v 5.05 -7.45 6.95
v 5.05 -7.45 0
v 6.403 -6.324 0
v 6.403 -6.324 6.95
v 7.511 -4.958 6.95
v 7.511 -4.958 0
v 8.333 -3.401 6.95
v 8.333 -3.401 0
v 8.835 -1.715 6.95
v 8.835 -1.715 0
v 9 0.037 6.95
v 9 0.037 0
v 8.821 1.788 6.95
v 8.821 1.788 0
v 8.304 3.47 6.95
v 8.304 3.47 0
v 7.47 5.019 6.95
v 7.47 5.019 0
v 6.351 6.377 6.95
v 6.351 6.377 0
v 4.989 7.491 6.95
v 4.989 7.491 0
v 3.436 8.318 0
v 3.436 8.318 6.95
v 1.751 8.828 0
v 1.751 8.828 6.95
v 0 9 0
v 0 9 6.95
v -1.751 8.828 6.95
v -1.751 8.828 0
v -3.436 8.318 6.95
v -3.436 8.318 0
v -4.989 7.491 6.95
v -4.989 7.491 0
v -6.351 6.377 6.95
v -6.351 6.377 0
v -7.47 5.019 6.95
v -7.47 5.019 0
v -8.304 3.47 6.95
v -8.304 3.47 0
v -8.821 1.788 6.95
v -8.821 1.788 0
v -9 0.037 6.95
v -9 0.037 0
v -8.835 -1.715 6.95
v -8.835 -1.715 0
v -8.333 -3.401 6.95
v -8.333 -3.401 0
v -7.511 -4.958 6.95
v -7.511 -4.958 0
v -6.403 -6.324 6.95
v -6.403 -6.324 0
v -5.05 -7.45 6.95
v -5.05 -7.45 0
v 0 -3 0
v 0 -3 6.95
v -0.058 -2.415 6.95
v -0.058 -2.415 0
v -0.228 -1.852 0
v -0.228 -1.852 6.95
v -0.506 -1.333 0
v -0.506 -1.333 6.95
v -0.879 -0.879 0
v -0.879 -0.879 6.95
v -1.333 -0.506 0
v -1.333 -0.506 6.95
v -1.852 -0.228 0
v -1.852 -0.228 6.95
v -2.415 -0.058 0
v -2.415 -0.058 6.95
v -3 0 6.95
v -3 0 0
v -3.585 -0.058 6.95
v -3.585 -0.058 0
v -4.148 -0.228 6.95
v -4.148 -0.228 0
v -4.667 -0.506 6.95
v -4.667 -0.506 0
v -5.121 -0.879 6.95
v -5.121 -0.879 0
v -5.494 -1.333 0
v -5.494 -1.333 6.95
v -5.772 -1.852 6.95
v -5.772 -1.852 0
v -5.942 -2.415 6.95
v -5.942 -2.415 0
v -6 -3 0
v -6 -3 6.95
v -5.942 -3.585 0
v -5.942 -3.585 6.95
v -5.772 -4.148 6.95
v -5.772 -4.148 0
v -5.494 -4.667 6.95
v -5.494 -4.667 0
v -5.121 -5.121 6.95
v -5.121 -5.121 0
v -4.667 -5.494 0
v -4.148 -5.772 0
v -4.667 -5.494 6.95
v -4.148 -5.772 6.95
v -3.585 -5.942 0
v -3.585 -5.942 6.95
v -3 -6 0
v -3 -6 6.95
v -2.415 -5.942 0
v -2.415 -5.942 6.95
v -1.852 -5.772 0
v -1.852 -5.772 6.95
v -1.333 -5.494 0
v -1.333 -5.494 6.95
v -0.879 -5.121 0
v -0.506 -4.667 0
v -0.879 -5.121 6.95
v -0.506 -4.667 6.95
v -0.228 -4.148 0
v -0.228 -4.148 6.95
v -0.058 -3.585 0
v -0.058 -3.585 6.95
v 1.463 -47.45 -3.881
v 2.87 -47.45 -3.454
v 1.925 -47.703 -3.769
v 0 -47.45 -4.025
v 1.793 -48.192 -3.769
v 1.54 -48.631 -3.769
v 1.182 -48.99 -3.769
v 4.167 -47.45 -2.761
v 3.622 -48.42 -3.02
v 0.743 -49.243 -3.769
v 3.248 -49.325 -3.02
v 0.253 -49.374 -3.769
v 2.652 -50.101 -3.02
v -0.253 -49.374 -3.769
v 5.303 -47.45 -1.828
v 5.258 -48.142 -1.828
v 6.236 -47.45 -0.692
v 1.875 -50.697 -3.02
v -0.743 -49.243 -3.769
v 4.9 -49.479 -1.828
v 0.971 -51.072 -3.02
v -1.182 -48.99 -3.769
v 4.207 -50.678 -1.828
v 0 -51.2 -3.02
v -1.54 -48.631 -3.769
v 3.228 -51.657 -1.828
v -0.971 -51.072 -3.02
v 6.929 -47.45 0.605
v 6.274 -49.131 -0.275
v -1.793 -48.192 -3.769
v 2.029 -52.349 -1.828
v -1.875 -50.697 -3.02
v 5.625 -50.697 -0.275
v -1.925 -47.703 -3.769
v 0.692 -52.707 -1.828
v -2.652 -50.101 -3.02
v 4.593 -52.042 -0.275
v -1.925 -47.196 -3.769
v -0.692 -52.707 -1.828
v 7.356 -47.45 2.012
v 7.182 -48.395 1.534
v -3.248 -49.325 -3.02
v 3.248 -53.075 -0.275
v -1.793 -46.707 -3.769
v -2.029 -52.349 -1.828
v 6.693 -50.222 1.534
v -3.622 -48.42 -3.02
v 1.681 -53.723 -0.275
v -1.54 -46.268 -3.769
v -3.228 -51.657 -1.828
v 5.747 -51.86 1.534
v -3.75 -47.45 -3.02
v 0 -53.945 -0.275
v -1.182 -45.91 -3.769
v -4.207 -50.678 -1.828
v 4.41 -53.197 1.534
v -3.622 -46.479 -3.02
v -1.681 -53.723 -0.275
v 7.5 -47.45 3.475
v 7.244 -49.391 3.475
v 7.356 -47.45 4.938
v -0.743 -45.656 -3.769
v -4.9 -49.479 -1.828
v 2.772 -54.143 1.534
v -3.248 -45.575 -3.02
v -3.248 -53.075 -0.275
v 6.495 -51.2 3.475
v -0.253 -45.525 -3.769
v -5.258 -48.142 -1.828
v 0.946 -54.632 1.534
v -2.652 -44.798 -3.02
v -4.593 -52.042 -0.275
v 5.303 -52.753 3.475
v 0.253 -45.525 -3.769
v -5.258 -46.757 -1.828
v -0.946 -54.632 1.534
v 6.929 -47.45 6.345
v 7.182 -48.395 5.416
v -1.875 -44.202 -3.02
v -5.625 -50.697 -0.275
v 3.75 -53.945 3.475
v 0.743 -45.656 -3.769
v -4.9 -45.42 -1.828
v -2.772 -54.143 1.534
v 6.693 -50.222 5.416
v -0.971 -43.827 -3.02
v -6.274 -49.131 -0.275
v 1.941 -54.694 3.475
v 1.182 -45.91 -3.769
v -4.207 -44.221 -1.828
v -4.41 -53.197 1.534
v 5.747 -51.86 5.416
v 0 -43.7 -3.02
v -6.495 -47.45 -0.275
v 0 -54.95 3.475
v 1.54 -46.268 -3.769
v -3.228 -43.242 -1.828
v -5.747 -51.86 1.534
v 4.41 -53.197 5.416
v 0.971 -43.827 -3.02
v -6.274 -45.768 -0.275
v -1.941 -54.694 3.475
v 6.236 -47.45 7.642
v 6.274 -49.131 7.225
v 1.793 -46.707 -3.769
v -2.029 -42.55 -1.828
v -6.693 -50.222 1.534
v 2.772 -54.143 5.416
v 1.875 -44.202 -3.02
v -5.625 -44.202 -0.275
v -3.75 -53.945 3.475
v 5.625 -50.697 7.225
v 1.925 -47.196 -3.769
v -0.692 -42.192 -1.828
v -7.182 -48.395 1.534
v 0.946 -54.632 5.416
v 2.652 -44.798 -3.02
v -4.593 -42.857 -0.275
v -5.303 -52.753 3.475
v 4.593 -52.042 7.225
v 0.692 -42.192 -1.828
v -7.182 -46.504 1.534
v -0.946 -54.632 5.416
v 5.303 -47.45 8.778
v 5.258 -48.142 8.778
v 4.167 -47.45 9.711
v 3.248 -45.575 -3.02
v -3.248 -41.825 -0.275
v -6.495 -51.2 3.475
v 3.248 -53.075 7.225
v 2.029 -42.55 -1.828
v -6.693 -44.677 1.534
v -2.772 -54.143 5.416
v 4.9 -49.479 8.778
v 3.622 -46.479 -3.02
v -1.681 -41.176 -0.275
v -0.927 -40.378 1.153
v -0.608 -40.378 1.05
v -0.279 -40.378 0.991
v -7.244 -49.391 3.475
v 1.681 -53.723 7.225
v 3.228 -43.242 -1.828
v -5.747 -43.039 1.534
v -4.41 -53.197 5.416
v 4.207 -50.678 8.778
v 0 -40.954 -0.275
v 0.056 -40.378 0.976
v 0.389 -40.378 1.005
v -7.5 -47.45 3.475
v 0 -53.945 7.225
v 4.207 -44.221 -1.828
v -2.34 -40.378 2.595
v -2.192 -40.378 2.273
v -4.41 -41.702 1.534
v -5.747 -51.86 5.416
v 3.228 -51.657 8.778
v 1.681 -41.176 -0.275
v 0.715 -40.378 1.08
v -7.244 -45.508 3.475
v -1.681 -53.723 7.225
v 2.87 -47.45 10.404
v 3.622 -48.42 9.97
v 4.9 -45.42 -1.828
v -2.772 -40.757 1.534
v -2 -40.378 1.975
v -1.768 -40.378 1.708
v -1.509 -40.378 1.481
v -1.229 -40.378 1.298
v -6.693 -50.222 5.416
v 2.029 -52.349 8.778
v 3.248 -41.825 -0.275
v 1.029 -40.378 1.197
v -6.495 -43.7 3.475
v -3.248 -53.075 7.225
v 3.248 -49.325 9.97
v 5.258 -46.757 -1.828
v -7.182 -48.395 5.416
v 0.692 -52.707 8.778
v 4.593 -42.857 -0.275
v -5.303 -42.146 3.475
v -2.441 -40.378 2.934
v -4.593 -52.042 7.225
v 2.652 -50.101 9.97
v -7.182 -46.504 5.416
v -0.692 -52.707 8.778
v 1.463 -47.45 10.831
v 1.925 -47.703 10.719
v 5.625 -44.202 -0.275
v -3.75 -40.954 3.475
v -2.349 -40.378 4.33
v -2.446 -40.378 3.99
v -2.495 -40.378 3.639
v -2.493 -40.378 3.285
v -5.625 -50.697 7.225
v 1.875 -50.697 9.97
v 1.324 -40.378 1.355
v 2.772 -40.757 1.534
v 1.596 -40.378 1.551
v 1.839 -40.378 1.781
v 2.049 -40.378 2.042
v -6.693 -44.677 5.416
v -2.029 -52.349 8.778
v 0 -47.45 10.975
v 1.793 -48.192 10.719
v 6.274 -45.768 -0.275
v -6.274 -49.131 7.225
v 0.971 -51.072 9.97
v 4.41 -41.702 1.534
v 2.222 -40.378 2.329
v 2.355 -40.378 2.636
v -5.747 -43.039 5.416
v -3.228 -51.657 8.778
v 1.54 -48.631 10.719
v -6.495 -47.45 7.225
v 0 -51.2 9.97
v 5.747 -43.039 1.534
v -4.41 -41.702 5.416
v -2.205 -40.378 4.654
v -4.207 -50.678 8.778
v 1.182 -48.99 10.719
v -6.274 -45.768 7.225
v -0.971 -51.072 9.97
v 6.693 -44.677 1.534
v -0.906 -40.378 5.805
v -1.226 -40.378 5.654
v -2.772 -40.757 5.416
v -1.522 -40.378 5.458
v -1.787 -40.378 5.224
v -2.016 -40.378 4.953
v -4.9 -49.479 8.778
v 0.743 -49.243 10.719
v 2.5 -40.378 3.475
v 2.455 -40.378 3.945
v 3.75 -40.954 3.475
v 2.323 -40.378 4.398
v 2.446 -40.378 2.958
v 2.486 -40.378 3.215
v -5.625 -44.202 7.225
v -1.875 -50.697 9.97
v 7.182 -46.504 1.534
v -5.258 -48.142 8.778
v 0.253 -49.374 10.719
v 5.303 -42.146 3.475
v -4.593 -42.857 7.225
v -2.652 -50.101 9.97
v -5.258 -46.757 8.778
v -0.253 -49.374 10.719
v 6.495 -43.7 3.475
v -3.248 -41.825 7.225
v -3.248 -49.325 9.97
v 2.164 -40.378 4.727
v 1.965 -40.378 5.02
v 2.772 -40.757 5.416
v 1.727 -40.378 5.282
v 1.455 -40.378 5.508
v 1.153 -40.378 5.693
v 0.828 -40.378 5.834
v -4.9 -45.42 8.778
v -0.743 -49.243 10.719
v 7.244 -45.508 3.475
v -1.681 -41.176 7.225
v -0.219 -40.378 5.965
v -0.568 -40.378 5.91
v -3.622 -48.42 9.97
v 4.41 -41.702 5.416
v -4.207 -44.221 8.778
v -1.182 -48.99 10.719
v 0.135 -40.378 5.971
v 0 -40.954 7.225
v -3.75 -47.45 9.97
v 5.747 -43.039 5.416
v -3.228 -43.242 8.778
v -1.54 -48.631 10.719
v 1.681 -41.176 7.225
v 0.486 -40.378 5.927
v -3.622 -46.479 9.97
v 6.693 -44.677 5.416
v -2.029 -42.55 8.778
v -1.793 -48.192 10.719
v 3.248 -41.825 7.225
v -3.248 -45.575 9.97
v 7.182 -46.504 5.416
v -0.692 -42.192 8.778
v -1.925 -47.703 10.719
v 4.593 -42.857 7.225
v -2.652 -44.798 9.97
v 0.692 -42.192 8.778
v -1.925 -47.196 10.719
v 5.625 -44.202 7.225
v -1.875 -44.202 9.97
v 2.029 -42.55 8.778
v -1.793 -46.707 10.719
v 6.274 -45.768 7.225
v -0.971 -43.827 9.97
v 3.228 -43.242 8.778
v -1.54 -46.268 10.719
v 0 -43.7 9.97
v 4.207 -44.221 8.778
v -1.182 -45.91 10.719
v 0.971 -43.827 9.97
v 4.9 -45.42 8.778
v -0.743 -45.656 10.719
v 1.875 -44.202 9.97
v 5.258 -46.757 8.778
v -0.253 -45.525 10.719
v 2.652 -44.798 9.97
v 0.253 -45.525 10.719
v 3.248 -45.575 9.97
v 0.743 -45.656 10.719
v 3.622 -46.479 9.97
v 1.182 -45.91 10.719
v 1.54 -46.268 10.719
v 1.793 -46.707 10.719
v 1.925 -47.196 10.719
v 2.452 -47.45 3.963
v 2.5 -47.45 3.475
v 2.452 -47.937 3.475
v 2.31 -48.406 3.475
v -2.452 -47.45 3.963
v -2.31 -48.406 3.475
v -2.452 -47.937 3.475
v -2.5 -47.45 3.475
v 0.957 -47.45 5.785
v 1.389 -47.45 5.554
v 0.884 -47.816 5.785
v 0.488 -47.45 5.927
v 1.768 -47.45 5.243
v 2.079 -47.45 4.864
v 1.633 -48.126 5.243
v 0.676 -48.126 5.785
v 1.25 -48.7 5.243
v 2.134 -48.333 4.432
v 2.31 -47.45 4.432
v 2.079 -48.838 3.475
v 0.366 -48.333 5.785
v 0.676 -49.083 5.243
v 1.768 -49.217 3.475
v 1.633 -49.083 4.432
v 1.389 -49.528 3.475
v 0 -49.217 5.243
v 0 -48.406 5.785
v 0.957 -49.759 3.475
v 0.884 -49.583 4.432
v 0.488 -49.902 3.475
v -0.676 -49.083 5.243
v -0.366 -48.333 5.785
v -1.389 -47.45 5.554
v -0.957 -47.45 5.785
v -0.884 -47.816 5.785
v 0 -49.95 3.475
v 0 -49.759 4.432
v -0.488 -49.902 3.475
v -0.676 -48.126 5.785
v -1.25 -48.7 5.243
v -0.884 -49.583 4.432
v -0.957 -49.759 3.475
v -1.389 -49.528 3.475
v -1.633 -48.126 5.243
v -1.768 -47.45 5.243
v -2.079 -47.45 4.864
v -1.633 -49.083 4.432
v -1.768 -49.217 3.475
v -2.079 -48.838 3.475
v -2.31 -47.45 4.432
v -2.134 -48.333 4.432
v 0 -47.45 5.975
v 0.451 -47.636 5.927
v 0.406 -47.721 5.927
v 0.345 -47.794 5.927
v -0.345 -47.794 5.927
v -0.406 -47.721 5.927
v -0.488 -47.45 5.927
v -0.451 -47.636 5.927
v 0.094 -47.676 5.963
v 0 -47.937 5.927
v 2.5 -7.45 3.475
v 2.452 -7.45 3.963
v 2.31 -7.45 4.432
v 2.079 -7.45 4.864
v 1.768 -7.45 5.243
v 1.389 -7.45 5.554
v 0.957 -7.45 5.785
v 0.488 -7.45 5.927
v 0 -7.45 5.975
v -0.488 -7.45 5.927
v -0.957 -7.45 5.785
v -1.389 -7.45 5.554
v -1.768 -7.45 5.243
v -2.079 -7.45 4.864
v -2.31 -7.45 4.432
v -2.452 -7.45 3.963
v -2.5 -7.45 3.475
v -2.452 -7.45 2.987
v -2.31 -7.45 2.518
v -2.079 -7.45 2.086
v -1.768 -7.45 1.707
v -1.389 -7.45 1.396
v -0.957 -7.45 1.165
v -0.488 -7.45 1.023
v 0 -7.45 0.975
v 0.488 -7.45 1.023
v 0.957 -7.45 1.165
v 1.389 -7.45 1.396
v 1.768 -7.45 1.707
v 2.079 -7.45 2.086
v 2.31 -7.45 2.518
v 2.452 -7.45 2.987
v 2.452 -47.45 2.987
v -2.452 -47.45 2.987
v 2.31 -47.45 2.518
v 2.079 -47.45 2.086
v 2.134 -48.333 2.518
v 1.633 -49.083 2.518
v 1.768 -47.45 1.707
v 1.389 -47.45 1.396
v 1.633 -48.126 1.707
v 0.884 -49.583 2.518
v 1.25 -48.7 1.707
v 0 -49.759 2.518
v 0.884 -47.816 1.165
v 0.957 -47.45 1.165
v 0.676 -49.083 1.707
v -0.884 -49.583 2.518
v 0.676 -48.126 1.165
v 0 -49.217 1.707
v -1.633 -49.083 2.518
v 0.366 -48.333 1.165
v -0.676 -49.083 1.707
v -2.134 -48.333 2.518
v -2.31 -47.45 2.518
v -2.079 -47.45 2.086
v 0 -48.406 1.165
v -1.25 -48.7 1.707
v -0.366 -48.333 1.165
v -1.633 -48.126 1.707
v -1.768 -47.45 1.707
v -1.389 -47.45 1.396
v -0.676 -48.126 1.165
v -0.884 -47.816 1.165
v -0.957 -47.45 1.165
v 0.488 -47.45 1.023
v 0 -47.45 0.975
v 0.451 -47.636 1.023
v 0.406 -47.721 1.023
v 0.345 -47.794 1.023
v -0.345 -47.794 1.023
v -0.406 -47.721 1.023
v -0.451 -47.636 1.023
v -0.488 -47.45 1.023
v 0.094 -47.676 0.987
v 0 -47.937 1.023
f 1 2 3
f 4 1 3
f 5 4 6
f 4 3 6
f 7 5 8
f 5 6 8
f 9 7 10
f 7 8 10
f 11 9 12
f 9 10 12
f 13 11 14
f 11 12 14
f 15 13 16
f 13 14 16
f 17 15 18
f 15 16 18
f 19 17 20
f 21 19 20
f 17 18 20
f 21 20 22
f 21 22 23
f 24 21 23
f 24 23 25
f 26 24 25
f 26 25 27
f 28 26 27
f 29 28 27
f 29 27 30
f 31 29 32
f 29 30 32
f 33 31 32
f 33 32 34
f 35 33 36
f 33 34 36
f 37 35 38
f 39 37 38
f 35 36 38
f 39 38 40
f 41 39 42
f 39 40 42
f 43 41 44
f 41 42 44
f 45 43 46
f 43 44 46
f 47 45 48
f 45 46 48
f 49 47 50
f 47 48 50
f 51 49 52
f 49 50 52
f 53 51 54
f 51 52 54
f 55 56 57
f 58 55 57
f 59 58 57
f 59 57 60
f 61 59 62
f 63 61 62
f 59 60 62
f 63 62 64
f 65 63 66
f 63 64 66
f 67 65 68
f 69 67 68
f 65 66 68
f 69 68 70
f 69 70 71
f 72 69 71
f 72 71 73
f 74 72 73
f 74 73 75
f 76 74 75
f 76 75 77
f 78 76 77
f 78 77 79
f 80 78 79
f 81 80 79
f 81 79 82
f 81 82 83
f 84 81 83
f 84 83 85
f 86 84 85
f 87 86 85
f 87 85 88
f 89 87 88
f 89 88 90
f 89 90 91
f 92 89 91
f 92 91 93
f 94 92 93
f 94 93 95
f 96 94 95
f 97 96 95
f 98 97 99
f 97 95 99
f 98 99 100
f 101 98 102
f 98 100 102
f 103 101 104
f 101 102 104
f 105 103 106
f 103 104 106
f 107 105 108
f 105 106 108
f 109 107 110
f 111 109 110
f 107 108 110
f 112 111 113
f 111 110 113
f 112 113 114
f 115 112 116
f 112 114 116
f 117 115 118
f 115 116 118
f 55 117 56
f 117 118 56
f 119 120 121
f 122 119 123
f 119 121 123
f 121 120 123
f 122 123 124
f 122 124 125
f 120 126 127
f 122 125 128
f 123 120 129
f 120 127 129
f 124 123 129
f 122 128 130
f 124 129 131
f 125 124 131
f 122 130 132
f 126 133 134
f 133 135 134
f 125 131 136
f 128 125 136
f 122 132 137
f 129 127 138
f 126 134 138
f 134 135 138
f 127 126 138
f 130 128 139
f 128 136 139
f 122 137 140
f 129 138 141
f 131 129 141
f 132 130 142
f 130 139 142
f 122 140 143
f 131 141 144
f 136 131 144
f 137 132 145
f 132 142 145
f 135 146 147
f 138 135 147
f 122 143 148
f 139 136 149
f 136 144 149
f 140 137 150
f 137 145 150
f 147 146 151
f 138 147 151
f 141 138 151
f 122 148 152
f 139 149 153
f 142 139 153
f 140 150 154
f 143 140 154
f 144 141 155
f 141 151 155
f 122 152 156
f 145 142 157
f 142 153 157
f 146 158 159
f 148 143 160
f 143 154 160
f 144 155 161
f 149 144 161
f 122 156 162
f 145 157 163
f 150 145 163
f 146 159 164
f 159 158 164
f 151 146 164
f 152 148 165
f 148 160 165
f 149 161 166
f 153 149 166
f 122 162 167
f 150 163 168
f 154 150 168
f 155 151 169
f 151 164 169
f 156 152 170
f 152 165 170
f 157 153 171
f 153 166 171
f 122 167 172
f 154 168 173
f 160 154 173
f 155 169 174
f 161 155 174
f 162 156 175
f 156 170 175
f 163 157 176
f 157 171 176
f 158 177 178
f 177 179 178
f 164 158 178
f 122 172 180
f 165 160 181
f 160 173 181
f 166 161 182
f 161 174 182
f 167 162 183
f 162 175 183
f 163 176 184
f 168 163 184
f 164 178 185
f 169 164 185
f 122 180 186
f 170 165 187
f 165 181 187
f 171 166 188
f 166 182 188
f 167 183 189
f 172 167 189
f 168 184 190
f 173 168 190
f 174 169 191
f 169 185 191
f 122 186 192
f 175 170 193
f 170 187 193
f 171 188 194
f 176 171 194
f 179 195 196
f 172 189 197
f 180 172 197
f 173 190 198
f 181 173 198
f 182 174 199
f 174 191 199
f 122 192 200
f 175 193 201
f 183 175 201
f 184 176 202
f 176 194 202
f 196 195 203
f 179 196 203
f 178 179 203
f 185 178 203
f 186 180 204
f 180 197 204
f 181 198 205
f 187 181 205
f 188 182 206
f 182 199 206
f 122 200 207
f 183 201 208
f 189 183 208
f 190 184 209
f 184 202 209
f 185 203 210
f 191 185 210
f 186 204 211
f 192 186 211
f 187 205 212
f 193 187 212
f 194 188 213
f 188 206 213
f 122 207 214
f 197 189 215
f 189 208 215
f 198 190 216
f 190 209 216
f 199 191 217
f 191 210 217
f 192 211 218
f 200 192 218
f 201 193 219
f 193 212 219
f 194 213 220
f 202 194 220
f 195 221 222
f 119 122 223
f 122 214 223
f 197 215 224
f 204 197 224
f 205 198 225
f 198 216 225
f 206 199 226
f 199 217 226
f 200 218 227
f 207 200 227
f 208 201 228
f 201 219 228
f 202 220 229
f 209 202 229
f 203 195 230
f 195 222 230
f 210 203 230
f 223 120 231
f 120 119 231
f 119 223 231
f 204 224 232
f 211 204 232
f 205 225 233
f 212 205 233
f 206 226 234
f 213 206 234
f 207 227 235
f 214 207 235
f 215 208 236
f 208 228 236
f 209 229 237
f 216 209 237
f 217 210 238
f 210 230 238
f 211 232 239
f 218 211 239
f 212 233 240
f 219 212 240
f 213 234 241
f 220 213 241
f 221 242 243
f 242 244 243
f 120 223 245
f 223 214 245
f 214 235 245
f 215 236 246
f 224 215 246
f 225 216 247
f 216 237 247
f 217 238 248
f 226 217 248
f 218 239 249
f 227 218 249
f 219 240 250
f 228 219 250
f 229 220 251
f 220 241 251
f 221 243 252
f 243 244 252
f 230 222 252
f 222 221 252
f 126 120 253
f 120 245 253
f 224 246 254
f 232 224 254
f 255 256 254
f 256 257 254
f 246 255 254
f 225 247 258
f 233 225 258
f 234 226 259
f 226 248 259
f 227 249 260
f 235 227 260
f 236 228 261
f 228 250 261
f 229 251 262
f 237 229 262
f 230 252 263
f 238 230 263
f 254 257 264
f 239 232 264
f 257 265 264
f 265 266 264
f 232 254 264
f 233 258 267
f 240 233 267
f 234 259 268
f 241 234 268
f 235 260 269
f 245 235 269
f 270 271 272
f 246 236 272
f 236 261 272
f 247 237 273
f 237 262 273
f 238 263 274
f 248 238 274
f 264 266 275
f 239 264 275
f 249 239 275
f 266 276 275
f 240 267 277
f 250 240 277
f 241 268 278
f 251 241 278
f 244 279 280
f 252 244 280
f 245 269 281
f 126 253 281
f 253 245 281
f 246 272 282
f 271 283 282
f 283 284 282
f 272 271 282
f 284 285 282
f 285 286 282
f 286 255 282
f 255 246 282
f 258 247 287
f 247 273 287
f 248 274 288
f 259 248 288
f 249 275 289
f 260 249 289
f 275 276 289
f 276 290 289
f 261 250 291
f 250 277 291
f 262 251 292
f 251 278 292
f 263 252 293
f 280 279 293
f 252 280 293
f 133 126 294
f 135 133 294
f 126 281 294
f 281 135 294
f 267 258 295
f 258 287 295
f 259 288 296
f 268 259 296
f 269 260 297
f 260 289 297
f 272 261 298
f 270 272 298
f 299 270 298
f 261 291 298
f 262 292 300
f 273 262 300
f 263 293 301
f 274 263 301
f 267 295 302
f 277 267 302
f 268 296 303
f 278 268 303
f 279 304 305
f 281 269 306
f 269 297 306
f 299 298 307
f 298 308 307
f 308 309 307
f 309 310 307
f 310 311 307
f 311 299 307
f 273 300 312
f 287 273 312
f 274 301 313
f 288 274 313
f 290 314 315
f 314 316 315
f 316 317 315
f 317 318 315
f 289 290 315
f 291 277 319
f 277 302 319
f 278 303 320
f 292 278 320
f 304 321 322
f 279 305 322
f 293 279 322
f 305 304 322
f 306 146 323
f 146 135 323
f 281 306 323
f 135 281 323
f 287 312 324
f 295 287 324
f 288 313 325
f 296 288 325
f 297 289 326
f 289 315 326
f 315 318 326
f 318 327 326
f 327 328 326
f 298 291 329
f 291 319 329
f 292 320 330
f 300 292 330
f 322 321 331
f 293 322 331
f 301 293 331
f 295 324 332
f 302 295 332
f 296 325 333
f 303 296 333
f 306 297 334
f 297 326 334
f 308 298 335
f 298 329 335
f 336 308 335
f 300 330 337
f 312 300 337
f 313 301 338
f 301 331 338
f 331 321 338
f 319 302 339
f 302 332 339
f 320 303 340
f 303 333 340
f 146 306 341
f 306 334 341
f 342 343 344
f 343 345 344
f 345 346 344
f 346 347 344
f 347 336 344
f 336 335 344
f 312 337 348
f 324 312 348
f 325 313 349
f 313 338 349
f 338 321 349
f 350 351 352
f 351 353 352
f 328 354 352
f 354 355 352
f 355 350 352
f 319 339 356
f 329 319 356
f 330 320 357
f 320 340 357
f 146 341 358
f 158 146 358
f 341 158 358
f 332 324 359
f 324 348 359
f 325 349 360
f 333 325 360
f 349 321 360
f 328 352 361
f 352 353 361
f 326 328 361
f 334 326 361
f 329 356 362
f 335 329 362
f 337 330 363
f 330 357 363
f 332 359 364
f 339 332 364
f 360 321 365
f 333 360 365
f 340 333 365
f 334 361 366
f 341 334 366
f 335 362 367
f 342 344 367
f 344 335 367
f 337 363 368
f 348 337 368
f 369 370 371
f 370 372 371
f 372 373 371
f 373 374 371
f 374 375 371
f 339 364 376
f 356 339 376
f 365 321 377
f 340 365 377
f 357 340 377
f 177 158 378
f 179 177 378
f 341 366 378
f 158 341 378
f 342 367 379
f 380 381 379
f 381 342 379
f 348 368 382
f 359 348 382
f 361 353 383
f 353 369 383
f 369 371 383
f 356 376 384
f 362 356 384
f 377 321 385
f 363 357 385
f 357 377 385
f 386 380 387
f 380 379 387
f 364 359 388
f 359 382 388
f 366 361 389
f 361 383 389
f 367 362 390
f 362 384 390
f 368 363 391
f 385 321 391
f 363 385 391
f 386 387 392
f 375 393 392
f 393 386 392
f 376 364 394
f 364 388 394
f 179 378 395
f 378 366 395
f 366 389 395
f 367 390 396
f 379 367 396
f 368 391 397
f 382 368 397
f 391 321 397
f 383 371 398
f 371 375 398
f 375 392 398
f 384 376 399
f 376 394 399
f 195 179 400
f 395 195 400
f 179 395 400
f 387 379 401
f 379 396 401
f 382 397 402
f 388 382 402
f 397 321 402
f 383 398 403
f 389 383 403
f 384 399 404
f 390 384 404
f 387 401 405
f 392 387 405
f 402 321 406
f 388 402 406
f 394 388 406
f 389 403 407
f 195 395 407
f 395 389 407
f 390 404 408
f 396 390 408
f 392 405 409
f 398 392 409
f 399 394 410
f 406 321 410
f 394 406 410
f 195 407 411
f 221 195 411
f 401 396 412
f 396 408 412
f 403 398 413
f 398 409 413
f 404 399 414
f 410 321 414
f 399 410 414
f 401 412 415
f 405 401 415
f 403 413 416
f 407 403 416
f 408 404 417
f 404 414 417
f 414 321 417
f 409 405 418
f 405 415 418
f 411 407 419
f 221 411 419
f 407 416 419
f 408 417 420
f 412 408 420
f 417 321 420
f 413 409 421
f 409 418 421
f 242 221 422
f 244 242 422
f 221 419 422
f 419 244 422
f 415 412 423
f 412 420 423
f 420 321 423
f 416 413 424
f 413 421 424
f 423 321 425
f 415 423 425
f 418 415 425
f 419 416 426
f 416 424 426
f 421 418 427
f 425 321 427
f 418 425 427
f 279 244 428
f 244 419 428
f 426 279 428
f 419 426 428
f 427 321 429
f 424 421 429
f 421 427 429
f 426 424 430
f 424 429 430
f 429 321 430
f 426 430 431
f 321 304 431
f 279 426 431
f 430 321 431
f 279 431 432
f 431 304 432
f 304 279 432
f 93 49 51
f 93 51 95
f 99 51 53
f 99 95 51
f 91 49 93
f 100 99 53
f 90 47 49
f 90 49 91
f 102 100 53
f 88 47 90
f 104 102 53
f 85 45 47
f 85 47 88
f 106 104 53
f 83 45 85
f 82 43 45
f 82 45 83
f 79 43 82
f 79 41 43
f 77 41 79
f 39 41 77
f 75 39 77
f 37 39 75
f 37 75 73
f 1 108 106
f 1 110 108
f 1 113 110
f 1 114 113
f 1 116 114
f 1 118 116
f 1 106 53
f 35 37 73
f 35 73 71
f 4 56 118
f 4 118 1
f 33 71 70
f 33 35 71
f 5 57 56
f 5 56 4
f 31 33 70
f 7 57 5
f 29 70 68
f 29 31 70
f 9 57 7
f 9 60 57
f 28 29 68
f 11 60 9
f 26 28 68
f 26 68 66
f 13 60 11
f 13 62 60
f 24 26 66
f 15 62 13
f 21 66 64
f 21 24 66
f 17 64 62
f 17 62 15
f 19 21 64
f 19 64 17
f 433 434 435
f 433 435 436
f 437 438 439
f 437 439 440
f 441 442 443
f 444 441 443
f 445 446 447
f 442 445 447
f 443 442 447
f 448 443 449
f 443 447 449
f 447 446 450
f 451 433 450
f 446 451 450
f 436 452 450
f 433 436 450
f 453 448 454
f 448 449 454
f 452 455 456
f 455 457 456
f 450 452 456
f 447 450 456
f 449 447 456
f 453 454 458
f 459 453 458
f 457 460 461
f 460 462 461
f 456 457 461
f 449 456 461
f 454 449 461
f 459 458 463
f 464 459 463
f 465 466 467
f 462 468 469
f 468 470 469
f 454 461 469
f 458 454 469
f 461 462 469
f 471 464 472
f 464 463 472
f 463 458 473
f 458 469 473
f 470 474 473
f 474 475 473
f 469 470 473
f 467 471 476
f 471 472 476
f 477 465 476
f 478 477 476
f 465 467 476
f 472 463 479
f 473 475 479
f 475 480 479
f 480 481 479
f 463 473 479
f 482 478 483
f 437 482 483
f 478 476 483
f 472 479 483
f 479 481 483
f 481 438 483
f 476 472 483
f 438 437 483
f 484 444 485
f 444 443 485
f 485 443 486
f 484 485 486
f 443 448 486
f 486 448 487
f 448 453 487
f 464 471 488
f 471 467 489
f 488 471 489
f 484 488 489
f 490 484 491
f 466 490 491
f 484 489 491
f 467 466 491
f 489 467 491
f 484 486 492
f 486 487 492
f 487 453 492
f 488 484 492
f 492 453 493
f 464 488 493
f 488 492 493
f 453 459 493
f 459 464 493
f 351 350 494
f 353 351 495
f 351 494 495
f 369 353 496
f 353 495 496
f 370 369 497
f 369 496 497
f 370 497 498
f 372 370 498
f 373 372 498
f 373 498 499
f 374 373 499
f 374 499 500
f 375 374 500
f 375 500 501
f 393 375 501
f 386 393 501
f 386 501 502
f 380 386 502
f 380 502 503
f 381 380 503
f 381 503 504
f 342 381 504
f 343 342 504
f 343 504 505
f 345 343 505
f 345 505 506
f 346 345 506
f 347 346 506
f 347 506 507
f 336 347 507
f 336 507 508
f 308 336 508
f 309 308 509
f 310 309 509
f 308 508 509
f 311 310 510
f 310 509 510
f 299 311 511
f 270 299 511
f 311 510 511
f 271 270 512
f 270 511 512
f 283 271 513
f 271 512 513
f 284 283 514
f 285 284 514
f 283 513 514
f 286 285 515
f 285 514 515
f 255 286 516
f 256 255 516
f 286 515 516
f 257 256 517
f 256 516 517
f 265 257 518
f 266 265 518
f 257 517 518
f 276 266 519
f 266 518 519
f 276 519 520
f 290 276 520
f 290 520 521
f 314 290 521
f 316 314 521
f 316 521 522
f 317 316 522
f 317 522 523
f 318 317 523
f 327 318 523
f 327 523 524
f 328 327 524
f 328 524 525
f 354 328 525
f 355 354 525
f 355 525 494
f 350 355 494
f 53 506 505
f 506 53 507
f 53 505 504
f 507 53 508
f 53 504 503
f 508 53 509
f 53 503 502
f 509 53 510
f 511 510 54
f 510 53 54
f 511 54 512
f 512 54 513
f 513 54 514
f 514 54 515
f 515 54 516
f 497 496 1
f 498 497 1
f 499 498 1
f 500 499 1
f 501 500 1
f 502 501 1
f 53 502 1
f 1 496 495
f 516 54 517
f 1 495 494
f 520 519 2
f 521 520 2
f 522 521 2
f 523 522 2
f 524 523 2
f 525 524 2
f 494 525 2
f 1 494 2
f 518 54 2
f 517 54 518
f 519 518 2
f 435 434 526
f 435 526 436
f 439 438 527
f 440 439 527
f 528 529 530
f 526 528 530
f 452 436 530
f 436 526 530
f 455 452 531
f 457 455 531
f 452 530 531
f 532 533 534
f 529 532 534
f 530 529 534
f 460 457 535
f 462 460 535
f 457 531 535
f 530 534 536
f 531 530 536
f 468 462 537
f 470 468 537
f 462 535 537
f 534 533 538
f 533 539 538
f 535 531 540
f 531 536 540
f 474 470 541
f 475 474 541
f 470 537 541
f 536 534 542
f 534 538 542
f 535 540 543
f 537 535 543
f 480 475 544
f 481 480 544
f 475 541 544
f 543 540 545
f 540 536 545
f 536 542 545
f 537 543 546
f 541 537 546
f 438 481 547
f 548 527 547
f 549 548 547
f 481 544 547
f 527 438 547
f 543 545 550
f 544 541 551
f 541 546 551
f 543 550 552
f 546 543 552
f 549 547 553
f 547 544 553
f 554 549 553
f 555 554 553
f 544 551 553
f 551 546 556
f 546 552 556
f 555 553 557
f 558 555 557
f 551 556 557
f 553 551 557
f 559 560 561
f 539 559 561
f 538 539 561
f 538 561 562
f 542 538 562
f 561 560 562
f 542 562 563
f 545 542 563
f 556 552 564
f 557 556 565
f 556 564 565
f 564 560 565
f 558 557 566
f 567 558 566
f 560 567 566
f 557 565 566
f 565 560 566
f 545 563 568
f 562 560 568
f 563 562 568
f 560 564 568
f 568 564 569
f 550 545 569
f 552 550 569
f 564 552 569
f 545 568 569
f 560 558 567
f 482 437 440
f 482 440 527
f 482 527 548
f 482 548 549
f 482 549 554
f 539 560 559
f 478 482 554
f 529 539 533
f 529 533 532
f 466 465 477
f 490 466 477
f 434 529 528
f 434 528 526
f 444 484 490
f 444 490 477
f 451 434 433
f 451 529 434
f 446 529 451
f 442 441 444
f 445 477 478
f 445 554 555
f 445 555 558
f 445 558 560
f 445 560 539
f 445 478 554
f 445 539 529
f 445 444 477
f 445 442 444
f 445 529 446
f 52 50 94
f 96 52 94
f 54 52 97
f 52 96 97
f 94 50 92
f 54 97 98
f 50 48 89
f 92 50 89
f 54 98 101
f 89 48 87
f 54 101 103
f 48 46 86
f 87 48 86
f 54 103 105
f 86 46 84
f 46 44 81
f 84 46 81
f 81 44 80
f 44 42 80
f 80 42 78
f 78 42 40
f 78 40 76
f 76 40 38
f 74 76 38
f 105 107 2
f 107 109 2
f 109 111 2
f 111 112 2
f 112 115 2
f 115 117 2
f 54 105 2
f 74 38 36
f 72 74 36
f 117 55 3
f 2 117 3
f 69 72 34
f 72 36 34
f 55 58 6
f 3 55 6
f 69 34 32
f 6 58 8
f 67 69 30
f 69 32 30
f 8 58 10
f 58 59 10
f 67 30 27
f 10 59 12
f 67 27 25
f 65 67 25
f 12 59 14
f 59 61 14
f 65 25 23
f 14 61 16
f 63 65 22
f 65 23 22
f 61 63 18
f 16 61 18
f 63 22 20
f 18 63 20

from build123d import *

# Parameters (mm, degrees)
F1_DEPTH = 6.95
F2_R     = 2.5
F3_DEPTH = 40
F6_R     = 3
F7_DEPTH = 10


with BuildPart() as f1:
    # F0 (on Top) → F1 (new body)
    with BuildSketch(Plane.XY):
        with BuildLine():
            Line((-5.050165, -7.449553), (5.050165, -7.449553))
            ThreePointArc((5.050165, -7.449553), (0, 9), (-5.050165, -7.449553))
        make_face()
    extrude(amount=F1_DEPTH)

    # F2 (on face) → F3 (join)
    with BuildSketch(Plane.XZ.offset(7.449553)):
        with Locations((0, 3.475)):
            Circle(F2_R)
    extrude(amount=F3_DEPTH)

    # F4 (on face) → F5 (revolve)
    with BuildSketch(Plane.XZ.offset(47.449553)):
        with BuildLine():
            Line((0, 0.975), (0, -4.025))
            ThreePointArc((0, -4.025), (7.5, 3.475), (0, 10.975))
            Line((0, 10.975), (0, 5.975))
            ThreePointArc((0, 5.975), (1.767767, 5.242767), (2.5, 3.475))
            ThreePointArc((2.5, 3.475), (1.767767, 1.707233), (0, 0.975))
        make_face()
    revolve(axis=Axis((0, -47.449553, 3.475), (0, 0, -1)))

    # F6 (on face) → F7 (cut)
    with BuildSketch(Plane.XY.offset(6.95)):
        with Locations((-3, -3)):
            Circle(F6_R)
    extrude(amount=-F7_DEPTH, mode=Mode.SUBTRACT)


solid = f1.part
